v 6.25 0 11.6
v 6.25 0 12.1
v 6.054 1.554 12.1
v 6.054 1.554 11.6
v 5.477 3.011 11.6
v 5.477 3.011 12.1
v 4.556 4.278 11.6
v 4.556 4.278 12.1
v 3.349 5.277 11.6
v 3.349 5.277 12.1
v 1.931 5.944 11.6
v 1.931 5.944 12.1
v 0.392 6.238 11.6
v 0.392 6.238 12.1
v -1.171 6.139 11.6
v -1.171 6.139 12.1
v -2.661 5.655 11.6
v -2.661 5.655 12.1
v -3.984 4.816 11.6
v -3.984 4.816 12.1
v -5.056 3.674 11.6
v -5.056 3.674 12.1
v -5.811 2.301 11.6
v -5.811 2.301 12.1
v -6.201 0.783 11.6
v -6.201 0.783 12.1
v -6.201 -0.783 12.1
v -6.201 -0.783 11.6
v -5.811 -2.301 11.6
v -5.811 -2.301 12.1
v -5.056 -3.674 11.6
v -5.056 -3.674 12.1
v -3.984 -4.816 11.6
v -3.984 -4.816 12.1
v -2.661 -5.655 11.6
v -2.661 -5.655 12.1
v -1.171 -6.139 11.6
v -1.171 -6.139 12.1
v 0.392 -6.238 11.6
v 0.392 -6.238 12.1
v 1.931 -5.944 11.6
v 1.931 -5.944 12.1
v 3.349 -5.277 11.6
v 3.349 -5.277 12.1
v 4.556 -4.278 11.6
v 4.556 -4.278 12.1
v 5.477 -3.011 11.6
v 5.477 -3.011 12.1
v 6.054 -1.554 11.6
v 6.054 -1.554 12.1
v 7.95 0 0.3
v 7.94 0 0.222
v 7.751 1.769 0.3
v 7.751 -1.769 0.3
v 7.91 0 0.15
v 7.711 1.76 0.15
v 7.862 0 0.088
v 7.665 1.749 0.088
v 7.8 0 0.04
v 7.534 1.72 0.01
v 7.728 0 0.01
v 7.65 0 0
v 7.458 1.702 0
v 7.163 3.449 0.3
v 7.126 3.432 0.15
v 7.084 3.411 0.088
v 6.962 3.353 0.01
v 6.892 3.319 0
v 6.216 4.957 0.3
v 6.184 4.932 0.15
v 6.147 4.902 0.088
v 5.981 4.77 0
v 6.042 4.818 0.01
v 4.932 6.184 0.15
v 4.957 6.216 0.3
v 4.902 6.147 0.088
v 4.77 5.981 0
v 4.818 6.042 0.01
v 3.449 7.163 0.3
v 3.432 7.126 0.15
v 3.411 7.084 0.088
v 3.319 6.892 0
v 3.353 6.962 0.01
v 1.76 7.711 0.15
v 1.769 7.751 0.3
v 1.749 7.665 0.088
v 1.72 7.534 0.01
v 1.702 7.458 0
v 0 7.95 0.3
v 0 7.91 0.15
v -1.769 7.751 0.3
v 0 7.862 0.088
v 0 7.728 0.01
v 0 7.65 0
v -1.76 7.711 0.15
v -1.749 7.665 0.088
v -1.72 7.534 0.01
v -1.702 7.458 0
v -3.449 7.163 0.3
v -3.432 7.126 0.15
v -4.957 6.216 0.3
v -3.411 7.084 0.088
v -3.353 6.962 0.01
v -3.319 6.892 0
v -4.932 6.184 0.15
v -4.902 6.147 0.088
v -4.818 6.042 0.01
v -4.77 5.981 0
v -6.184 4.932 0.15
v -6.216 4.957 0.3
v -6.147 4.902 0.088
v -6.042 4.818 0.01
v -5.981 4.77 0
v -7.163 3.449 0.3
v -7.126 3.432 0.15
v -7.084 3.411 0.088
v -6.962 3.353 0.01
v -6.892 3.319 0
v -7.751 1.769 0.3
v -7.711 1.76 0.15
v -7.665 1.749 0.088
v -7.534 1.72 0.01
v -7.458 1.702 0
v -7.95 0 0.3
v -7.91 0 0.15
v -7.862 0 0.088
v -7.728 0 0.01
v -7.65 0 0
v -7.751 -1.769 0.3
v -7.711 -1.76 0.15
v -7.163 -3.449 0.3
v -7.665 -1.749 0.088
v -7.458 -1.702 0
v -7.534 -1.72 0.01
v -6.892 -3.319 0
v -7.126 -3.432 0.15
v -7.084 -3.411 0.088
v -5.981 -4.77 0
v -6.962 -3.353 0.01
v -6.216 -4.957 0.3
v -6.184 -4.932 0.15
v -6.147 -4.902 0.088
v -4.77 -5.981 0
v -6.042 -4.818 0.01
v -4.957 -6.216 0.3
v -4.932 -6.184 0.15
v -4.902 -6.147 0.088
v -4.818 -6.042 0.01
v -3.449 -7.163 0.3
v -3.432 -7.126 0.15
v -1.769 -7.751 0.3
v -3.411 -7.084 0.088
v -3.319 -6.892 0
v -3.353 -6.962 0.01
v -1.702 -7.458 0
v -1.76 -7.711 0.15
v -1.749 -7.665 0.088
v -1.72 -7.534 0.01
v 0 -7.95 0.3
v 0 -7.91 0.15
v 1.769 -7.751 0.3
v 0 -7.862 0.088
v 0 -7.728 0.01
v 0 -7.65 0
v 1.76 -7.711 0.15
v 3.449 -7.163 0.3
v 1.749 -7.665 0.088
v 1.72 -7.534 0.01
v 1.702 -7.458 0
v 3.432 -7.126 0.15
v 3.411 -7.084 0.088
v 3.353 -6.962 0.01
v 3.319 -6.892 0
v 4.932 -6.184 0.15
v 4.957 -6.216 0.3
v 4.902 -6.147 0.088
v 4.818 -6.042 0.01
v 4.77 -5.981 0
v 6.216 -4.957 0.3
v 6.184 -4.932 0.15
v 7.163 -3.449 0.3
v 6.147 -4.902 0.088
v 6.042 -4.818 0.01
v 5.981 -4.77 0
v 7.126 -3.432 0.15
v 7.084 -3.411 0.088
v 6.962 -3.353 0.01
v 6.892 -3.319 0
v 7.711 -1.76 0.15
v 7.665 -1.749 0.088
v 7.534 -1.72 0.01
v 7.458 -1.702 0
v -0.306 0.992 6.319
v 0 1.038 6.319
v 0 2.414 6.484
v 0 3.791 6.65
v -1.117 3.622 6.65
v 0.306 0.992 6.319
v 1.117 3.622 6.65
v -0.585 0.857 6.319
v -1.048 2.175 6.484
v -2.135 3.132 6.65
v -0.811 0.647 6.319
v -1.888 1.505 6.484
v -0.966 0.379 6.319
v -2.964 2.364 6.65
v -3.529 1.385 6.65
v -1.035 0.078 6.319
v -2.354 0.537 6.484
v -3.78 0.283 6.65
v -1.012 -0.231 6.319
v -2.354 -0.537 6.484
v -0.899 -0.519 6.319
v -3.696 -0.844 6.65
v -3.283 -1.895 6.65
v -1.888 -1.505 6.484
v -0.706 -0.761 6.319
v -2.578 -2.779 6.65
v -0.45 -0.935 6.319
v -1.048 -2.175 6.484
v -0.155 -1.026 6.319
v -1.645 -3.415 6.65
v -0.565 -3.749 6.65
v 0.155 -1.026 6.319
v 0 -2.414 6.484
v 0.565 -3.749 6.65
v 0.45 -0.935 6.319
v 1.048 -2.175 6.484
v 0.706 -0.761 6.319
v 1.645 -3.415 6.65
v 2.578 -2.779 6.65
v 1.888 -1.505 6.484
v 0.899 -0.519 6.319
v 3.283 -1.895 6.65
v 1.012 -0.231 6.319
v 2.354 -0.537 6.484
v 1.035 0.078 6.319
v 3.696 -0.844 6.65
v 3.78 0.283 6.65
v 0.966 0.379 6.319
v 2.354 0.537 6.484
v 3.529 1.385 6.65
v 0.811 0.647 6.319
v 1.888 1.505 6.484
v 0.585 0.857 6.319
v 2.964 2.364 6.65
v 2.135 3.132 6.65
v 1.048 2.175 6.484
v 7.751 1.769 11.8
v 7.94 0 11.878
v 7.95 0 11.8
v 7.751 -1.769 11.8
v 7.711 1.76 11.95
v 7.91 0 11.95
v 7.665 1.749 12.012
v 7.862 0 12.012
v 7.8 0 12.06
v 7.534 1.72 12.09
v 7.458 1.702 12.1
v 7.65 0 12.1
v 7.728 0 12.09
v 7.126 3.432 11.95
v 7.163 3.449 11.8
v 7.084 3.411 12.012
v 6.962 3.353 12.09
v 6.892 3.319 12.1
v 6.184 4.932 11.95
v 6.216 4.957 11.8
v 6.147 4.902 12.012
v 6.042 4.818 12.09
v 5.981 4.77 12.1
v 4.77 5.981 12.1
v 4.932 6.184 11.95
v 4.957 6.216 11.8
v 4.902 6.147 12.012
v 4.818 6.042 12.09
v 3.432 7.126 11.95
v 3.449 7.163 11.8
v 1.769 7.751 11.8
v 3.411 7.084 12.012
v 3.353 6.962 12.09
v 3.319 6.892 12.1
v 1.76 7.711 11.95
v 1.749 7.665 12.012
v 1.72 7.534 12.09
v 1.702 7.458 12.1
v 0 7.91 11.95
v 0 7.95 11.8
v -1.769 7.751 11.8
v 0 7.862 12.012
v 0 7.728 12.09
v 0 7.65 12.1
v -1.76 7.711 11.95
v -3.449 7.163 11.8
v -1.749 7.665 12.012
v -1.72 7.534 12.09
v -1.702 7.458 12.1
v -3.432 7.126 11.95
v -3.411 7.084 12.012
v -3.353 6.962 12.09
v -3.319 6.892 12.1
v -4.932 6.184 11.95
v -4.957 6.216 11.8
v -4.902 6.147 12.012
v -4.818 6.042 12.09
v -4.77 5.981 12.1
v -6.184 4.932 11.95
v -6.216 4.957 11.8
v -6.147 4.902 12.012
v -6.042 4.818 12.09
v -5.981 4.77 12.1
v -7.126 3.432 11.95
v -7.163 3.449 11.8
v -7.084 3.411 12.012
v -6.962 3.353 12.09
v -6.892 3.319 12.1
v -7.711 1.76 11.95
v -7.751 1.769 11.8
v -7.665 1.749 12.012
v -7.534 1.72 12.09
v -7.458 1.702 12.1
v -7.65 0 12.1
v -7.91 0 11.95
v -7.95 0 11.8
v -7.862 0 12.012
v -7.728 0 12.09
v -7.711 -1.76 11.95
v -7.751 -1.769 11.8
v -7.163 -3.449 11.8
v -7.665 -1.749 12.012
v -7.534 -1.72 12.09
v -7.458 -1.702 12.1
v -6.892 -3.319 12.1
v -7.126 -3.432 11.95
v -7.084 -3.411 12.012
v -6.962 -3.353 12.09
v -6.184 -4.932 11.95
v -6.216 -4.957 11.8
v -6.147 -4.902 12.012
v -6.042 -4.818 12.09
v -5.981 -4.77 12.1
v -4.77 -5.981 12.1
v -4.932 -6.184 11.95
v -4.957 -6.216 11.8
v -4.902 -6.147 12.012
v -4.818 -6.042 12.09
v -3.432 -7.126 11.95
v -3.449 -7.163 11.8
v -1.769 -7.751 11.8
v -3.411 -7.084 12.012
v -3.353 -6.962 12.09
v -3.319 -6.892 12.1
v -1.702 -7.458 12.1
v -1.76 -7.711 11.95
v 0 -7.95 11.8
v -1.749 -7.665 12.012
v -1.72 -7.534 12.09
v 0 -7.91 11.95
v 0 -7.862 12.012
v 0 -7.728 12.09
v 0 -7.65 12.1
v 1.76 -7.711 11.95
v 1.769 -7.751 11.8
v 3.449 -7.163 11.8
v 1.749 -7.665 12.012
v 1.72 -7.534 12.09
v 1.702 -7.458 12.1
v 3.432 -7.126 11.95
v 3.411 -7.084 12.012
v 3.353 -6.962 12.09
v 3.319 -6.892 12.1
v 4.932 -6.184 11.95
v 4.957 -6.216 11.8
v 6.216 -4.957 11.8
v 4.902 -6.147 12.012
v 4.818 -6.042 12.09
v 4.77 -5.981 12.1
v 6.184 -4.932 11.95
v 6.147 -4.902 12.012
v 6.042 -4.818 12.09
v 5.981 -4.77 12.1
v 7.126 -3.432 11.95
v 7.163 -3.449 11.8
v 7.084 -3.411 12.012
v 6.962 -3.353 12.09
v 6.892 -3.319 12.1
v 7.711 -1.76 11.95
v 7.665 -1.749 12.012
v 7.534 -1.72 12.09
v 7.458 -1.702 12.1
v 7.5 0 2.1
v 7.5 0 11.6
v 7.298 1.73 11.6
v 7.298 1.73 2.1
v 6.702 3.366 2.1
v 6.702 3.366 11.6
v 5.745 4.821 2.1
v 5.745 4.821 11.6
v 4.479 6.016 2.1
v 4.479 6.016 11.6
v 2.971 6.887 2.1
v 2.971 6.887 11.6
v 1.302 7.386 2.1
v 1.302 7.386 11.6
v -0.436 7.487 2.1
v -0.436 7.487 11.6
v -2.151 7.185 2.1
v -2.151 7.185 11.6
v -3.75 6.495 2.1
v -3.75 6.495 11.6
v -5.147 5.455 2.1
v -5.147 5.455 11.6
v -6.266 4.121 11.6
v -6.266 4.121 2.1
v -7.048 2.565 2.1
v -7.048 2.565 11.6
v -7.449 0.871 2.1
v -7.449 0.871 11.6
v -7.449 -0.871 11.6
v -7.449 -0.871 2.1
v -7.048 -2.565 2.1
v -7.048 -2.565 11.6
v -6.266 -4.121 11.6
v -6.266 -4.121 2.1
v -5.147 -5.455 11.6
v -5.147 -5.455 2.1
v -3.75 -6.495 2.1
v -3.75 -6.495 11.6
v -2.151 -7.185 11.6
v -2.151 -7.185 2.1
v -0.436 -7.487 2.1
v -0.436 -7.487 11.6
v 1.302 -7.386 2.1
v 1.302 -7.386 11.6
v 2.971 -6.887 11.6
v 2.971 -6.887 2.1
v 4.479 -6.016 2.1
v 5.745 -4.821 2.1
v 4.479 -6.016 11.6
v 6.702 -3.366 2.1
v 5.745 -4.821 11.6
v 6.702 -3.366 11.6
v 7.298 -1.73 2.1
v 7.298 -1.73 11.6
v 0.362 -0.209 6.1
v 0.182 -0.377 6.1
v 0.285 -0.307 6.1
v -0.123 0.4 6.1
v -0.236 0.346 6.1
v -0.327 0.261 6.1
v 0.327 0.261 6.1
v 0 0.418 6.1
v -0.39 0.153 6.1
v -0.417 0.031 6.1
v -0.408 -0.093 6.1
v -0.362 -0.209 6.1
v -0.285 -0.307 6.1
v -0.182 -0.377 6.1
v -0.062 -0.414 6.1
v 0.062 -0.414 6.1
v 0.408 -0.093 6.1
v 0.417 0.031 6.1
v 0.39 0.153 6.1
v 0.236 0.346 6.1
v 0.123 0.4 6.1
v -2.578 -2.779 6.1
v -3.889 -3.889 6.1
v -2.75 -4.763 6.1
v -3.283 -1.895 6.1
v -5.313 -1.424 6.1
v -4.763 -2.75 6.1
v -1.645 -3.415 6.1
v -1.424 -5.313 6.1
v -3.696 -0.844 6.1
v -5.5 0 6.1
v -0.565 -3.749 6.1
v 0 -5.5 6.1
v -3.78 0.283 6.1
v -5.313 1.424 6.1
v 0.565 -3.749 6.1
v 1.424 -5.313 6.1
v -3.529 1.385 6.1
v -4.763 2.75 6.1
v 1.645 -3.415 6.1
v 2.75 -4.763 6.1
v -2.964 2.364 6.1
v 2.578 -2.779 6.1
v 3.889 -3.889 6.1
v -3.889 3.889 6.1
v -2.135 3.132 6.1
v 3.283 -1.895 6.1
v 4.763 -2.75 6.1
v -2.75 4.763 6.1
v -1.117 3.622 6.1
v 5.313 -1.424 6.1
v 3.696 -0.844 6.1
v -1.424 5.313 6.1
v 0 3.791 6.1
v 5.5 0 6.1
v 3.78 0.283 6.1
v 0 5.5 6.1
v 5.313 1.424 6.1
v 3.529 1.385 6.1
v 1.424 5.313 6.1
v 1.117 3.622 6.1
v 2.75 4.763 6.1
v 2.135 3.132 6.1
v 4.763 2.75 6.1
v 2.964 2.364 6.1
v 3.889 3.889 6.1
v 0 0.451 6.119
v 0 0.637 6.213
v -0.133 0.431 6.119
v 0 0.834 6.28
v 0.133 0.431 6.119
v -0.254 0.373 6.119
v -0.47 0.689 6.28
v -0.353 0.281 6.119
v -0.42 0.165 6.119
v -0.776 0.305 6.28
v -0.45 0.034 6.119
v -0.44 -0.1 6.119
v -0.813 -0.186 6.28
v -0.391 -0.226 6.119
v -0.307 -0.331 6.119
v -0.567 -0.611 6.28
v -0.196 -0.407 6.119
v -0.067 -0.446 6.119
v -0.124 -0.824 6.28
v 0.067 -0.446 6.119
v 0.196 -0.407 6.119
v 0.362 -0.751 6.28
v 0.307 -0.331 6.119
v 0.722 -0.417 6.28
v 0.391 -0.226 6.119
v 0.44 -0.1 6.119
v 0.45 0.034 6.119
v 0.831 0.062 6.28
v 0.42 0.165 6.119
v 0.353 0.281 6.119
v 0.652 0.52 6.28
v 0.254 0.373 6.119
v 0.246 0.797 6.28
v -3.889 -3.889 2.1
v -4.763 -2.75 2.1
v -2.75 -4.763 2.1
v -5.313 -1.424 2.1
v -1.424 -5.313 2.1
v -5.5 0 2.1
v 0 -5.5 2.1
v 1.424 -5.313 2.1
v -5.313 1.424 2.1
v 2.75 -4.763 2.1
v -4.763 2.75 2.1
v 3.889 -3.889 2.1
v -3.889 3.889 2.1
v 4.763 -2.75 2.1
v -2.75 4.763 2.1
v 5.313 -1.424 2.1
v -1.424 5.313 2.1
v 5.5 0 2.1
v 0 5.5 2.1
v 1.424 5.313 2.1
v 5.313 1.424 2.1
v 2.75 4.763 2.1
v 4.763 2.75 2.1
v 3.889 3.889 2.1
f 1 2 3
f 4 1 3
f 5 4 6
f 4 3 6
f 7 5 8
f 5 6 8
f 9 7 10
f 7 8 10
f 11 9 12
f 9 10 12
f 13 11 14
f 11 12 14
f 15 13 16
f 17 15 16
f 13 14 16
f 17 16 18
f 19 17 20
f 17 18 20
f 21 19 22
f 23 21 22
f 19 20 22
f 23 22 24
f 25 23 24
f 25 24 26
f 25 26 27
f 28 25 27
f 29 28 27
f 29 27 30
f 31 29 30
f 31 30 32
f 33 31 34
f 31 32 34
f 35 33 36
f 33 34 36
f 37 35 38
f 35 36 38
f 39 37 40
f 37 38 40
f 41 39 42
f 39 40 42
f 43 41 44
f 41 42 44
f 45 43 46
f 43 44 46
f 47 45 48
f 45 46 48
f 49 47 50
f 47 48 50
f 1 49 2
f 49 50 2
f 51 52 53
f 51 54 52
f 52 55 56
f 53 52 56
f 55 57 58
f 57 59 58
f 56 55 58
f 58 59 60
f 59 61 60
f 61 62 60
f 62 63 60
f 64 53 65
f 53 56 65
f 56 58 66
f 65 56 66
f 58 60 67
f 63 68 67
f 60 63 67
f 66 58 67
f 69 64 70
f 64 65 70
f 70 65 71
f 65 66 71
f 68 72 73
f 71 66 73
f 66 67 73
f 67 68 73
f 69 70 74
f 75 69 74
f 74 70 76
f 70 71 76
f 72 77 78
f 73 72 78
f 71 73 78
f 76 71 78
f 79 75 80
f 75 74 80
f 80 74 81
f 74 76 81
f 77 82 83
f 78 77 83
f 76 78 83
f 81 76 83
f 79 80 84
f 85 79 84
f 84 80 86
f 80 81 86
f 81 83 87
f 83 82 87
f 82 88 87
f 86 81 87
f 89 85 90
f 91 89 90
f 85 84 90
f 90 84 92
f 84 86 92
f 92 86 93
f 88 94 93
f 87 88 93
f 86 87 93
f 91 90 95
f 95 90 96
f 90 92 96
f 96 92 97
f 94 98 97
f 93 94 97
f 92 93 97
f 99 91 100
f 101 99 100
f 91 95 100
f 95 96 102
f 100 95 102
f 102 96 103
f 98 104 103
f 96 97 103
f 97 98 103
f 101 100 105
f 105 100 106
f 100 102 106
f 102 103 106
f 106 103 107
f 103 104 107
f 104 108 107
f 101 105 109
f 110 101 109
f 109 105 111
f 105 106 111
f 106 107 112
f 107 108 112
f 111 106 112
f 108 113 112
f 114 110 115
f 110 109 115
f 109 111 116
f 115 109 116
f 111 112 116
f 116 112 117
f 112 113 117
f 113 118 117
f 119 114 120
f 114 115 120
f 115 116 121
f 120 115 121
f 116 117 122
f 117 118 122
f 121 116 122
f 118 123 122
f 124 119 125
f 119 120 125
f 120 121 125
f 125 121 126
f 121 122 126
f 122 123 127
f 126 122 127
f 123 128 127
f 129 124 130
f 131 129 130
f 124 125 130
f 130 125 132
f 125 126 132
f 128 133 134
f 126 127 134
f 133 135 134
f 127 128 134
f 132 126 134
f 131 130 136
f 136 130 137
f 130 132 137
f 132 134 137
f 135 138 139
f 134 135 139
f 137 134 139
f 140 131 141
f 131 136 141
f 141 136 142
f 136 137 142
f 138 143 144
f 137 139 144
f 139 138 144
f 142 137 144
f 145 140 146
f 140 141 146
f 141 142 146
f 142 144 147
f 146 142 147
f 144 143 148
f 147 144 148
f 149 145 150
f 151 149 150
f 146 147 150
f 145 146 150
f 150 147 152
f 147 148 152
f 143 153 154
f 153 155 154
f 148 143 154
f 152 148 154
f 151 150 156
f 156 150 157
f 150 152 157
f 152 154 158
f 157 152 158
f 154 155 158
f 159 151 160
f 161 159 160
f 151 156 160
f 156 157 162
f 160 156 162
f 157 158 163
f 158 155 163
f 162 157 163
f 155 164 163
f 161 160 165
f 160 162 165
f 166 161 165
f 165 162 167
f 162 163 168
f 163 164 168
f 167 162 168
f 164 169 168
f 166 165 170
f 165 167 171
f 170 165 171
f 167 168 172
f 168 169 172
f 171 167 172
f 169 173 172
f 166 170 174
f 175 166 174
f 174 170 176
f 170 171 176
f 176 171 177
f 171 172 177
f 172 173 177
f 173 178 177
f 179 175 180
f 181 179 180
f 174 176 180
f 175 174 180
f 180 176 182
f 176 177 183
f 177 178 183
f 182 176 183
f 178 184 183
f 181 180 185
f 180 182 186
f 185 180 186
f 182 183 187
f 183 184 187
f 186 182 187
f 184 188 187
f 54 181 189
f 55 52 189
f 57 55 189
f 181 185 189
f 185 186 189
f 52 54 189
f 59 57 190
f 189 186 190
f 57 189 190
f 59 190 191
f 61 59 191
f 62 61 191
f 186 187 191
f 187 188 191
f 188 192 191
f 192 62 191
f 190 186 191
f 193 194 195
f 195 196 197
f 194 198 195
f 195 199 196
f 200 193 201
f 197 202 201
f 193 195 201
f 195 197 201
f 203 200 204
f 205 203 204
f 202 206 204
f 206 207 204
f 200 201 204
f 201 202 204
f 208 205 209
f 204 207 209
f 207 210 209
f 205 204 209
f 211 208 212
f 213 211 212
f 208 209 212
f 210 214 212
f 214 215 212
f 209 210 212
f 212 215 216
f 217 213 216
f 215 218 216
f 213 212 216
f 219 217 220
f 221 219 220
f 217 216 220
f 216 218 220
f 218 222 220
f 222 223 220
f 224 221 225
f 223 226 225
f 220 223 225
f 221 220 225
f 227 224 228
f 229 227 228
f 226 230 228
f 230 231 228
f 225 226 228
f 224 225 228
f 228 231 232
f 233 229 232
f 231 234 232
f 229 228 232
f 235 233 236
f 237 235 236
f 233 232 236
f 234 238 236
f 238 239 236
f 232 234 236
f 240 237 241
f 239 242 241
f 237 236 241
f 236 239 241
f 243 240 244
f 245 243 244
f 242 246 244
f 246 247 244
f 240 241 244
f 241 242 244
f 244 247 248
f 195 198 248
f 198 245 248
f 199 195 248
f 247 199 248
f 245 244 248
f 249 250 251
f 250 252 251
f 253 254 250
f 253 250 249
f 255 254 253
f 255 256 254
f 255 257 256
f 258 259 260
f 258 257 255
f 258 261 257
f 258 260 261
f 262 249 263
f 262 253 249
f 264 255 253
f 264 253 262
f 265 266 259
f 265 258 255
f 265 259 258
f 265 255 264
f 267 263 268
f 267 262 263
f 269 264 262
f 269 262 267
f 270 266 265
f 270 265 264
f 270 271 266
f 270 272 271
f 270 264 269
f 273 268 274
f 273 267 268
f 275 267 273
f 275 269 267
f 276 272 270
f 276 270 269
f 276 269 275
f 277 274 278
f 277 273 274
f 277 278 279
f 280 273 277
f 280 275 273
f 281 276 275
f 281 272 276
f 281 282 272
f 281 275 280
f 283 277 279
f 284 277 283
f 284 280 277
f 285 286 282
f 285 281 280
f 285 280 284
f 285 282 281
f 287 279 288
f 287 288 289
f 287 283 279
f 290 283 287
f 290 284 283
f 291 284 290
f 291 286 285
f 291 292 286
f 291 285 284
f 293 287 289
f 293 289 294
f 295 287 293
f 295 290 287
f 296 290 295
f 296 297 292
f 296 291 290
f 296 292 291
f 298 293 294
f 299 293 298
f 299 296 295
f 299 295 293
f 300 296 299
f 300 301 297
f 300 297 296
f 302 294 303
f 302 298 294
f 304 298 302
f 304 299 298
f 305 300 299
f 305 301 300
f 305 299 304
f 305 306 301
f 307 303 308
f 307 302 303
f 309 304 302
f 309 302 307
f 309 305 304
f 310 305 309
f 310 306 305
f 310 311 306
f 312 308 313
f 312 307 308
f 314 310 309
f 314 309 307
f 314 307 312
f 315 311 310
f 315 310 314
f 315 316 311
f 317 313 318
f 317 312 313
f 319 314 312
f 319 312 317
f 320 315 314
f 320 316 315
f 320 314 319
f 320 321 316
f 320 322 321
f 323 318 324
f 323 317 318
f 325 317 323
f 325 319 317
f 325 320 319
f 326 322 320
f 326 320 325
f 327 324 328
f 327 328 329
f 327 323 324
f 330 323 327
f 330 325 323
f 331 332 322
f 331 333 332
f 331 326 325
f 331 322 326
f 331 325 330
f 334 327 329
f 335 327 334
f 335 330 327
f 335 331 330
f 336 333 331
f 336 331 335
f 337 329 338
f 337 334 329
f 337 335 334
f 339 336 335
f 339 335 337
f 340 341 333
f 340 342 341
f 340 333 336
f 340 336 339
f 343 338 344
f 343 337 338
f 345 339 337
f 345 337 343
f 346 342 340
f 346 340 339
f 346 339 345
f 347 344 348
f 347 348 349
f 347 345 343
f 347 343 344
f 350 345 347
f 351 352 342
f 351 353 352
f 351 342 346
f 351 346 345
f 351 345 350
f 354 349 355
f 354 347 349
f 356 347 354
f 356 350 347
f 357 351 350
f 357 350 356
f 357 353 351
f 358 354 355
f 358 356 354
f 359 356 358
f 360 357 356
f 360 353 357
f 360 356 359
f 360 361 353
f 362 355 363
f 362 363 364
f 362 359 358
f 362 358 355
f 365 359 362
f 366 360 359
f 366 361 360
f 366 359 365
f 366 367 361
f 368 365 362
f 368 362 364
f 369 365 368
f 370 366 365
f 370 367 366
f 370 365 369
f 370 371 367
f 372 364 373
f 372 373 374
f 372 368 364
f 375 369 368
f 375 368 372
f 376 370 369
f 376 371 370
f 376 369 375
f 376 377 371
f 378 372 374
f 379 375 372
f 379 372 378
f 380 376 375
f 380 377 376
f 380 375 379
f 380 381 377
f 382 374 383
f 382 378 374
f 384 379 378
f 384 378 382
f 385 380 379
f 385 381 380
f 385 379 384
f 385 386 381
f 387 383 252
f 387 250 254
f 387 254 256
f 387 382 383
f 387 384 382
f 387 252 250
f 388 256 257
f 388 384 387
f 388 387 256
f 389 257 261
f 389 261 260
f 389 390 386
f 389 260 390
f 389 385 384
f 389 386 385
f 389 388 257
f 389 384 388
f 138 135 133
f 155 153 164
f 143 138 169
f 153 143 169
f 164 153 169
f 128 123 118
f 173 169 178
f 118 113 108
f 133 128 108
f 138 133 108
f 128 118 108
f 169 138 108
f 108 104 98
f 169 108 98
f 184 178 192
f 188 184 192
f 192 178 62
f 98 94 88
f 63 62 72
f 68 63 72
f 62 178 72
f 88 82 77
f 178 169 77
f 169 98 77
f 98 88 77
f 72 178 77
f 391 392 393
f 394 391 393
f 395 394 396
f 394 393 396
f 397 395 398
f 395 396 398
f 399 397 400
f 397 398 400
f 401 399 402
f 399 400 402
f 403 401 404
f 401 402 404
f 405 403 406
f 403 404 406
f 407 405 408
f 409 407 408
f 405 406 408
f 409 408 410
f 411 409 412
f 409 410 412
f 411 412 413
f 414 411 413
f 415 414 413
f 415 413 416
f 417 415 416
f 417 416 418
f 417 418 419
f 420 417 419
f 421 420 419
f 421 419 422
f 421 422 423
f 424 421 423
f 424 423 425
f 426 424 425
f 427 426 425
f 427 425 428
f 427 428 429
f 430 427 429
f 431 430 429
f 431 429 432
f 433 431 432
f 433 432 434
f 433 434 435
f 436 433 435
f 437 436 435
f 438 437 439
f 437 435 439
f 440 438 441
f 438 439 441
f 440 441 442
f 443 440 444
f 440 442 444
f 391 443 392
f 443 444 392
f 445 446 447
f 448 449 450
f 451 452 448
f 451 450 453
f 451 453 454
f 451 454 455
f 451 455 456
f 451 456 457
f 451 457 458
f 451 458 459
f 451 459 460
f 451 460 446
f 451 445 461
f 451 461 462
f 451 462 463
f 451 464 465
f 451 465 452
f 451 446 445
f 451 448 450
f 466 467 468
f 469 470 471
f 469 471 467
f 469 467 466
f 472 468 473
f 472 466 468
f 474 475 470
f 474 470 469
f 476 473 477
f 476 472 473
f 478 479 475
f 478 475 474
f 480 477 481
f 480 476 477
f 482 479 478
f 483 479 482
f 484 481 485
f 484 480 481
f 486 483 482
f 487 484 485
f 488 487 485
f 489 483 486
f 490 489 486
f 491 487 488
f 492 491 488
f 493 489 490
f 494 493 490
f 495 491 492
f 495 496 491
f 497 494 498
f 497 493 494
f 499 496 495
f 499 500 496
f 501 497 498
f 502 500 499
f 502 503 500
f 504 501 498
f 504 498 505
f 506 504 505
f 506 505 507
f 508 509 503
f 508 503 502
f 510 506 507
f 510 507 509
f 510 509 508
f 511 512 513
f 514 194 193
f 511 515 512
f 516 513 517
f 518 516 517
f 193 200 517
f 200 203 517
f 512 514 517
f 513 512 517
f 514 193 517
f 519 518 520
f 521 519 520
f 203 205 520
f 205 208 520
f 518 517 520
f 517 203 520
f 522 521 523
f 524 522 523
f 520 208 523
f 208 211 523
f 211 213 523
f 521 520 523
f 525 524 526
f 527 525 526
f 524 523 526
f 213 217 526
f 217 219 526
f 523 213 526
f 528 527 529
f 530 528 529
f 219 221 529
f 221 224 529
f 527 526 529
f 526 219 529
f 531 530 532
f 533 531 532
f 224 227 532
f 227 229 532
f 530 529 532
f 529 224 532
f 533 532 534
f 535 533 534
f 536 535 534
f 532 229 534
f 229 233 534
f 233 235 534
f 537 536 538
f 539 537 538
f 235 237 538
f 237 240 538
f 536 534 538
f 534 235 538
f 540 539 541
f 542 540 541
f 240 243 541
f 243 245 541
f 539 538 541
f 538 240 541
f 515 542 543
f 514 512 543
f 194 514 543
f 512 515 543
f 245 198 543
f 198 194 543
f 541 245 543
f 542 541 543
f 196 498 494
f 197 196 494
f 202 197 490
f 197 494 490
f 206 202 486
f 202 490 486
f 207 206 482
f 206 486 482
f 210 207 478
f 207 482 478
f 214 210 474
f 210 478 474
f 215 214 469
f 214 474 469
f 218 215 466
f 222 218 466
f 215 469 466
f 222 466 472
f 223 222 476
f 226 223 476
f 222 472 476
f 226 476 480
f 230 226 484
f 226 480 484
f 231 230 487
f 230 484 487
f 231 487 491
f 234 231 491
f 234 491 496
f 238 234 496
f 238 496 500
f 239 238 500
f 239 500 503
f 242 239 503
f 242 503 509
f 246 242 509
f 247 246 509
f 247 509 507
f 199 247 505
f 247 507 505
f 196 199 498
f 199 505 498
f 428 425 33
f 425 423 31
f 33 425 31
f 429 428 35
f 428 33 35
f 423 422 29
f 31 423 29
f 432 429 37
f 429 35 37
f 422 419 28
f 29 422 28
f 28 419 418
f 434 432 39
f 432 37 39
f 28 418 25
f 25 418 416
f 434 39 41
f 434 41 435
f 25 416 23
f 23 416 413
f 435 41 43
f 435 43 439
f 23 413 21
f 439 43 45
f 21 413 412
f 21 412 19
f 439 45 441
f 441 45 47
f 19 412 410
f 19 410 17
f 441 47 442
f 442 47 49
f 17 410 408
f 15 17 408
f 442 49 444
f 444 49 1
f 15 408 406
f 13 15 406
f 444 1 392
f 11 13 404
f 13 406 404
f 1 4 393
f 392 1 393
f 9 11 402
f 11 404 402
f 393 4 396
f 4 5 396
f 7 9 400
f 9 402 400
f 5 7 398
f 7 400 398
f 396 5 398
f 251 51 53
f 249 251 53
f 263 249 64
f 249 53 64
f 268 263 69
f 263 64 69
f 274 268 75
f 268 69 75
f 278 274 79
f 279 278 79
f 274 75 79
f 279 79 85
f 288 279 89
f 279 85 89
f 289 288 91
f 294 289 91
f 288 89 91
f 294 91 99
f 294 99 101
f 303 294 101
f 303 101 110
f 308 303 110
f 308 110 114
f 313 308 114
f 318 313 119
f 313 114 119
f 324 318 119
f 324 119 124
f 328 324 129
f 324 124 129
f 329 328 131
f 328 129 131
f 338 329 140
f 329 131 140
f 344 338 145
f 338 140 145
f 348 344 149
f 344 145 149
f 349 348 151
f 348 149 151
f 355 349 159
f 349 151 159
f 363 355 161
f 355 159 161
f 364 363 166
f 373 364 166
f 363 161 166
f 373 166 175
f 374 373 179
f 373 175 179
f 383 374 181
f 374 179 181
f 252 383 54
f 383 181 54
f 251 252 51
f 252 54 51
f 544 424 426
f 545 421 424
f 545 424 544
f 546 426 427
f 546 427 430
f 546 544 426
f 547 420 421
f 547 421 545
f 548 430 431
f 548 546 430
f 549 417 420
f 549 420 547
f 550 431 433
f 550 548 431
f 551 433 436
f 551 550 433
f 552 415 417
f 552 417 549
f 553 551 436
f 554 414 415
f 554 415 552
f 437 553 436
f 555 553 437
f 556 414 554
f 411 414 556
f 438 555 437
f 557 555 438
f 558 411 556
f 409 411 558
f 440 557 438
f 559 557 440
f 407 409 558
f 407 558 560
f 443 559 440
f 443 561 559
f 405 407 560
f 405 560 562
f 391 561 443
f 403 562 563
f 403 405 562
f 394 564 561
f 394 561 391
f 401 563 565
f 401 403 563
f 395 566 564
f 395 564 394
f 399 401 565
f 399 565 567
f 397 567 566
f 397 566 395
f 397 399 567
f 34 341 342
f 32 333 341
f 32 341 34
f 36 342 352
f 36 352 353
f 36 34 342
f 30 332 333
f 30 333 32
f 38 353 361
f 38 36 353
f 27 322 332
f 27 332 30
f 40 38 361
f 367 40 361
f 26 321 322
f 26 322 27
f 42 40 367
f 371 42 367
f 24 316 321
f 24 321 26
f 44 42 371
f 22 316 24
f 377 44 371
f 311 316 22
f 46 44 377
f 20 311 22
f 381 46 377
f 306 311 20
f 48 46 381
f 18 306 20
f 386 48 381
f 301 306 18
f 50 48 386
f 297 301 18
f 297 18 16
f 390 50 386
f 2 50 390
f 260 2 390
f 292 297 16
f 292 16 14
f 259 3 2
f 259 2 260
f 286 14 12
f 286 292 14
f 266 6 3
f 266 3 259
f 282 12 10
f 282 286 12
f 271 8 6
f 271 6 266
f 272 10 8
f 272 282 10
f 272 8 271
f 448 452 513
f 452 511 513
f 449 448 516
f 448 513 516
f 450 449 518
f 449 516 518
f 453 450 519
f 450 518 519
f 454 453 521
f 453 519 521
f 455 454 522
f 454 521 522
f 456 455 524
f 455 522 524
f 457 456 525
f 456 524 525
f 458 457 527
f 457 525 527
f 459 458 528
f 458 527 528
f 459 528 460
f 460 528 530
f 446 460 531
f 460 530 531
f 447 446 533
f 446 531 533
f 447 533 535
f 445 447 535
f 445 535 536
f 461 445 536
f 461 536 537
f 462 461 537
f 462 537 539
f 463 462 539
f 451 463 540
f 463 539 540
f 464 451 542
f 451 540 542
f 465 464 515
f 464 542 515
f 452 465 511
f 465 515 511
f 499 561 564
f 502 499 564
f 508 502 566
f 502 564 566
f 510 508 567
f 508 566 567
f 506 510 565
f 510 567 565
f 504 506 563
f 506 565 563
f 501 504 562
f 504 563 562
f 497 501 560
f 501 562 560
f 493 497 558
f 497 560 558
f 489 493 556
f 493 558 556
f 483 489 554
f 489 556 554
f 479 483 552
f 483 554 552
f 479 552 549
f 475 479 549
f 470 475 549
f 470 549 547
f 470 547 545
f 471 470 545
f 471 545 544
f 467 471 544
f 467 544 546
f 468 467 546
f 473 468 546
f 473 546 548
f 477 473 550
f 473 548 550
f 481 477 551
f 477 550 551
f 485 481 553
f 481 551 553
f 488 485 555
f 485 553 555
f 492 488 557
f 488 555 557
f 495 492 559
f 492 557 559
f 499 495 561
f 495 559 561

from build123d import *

# Parameters (mm, degrees)
SKETCH1_R           = 7.95
BOSS_EXTRUDE1_DEPTH = 12.1
FILLET1_R           = 0.3
SKETCH3_R           = 7.5
CUT_EXTRUDE2_DEPTH  = 10
SKETCH2_R           = 7.65
SKETCH2_R_2         = 6.25
BOSS_EXTRUDE2_DEPTH = 0.5
SKETCH4_R           = 5.5
BOSS_EXTRUDE3_DEPTH = 4


with BuildPart() as part:
    # Sketch1 → Boss-Extrude1 (new body)
    with BuildSketch(Plane.XY):
        Circle(SKETCH1_R)
    extrude(amount=BOSS_EXTRUDE1_DEPTH)

    # Fillet1
    fillet1_edges = [part.edges().sort_by_distance(p)[0] for p in [
        (-7.95, 0, 0),
        (-7.95, 0, 12.1),
    ]]
    fillet(fillet1_edges, radius=FILLET1_R)

    # Sketch3 → Cut-Extrude2 (cut)
    with BuildSketch(Plane.XY.offset(12.1)):
        Circle(SKETCH3_R)
    extrude(amount=-CUT_EXTRUDE2_DEPTH, mode=Mode.SUBTRACT)

    # Sketch2 → Boss-Extrude2 (add)
    with BuildSketch(Plane.XY.offset(12.1)):
        Circle(SKETCH2_R)
        Circle(SKETCH2_R_2, mode=Mode.SUBTRACT)
    extrude(amount=-BOSS_EXTRUDE2_DEPTH)

    # Sketch4 → Boss-Extrude3 (add)
    with BuildSketch(Plane.XY.offset(2.1)):
        Circle(SKETCH4_R)
    extrude(amount=BOSS_EXTRUDE3_DEPTH)

    # Sketch6 → Revolve2 (revolve)
    with BuildSketch(Plane(origin=(0, 0, 0), x_dir=(0, 0, -1), z_dir=(1, 0, 0))):
        with BuildLine():
            Line((-5.5, 3.790901005), (-5.5, 0))
            Line((-5.5, 0), (-6, 0))
            Line((-6, 0), (-6, 0.25))
            Line((-6, 0.25), (-6.119453289, 0.451240685))
            ThreePointArc((-6.119453289, 0.451240685), (-6.249755753, 0.734093475), (-6.318842572, 1.03775685))
            Line((-6.318842572, 1.03775685), (-6.65, 3.790901005))
            Line((-6.65, 3.790901005), (-5.5, 3.790901005))
        make_face()
    revolve(axis=Axis((0, 0, 0), (0, 0, 1)))


solid = part.part
